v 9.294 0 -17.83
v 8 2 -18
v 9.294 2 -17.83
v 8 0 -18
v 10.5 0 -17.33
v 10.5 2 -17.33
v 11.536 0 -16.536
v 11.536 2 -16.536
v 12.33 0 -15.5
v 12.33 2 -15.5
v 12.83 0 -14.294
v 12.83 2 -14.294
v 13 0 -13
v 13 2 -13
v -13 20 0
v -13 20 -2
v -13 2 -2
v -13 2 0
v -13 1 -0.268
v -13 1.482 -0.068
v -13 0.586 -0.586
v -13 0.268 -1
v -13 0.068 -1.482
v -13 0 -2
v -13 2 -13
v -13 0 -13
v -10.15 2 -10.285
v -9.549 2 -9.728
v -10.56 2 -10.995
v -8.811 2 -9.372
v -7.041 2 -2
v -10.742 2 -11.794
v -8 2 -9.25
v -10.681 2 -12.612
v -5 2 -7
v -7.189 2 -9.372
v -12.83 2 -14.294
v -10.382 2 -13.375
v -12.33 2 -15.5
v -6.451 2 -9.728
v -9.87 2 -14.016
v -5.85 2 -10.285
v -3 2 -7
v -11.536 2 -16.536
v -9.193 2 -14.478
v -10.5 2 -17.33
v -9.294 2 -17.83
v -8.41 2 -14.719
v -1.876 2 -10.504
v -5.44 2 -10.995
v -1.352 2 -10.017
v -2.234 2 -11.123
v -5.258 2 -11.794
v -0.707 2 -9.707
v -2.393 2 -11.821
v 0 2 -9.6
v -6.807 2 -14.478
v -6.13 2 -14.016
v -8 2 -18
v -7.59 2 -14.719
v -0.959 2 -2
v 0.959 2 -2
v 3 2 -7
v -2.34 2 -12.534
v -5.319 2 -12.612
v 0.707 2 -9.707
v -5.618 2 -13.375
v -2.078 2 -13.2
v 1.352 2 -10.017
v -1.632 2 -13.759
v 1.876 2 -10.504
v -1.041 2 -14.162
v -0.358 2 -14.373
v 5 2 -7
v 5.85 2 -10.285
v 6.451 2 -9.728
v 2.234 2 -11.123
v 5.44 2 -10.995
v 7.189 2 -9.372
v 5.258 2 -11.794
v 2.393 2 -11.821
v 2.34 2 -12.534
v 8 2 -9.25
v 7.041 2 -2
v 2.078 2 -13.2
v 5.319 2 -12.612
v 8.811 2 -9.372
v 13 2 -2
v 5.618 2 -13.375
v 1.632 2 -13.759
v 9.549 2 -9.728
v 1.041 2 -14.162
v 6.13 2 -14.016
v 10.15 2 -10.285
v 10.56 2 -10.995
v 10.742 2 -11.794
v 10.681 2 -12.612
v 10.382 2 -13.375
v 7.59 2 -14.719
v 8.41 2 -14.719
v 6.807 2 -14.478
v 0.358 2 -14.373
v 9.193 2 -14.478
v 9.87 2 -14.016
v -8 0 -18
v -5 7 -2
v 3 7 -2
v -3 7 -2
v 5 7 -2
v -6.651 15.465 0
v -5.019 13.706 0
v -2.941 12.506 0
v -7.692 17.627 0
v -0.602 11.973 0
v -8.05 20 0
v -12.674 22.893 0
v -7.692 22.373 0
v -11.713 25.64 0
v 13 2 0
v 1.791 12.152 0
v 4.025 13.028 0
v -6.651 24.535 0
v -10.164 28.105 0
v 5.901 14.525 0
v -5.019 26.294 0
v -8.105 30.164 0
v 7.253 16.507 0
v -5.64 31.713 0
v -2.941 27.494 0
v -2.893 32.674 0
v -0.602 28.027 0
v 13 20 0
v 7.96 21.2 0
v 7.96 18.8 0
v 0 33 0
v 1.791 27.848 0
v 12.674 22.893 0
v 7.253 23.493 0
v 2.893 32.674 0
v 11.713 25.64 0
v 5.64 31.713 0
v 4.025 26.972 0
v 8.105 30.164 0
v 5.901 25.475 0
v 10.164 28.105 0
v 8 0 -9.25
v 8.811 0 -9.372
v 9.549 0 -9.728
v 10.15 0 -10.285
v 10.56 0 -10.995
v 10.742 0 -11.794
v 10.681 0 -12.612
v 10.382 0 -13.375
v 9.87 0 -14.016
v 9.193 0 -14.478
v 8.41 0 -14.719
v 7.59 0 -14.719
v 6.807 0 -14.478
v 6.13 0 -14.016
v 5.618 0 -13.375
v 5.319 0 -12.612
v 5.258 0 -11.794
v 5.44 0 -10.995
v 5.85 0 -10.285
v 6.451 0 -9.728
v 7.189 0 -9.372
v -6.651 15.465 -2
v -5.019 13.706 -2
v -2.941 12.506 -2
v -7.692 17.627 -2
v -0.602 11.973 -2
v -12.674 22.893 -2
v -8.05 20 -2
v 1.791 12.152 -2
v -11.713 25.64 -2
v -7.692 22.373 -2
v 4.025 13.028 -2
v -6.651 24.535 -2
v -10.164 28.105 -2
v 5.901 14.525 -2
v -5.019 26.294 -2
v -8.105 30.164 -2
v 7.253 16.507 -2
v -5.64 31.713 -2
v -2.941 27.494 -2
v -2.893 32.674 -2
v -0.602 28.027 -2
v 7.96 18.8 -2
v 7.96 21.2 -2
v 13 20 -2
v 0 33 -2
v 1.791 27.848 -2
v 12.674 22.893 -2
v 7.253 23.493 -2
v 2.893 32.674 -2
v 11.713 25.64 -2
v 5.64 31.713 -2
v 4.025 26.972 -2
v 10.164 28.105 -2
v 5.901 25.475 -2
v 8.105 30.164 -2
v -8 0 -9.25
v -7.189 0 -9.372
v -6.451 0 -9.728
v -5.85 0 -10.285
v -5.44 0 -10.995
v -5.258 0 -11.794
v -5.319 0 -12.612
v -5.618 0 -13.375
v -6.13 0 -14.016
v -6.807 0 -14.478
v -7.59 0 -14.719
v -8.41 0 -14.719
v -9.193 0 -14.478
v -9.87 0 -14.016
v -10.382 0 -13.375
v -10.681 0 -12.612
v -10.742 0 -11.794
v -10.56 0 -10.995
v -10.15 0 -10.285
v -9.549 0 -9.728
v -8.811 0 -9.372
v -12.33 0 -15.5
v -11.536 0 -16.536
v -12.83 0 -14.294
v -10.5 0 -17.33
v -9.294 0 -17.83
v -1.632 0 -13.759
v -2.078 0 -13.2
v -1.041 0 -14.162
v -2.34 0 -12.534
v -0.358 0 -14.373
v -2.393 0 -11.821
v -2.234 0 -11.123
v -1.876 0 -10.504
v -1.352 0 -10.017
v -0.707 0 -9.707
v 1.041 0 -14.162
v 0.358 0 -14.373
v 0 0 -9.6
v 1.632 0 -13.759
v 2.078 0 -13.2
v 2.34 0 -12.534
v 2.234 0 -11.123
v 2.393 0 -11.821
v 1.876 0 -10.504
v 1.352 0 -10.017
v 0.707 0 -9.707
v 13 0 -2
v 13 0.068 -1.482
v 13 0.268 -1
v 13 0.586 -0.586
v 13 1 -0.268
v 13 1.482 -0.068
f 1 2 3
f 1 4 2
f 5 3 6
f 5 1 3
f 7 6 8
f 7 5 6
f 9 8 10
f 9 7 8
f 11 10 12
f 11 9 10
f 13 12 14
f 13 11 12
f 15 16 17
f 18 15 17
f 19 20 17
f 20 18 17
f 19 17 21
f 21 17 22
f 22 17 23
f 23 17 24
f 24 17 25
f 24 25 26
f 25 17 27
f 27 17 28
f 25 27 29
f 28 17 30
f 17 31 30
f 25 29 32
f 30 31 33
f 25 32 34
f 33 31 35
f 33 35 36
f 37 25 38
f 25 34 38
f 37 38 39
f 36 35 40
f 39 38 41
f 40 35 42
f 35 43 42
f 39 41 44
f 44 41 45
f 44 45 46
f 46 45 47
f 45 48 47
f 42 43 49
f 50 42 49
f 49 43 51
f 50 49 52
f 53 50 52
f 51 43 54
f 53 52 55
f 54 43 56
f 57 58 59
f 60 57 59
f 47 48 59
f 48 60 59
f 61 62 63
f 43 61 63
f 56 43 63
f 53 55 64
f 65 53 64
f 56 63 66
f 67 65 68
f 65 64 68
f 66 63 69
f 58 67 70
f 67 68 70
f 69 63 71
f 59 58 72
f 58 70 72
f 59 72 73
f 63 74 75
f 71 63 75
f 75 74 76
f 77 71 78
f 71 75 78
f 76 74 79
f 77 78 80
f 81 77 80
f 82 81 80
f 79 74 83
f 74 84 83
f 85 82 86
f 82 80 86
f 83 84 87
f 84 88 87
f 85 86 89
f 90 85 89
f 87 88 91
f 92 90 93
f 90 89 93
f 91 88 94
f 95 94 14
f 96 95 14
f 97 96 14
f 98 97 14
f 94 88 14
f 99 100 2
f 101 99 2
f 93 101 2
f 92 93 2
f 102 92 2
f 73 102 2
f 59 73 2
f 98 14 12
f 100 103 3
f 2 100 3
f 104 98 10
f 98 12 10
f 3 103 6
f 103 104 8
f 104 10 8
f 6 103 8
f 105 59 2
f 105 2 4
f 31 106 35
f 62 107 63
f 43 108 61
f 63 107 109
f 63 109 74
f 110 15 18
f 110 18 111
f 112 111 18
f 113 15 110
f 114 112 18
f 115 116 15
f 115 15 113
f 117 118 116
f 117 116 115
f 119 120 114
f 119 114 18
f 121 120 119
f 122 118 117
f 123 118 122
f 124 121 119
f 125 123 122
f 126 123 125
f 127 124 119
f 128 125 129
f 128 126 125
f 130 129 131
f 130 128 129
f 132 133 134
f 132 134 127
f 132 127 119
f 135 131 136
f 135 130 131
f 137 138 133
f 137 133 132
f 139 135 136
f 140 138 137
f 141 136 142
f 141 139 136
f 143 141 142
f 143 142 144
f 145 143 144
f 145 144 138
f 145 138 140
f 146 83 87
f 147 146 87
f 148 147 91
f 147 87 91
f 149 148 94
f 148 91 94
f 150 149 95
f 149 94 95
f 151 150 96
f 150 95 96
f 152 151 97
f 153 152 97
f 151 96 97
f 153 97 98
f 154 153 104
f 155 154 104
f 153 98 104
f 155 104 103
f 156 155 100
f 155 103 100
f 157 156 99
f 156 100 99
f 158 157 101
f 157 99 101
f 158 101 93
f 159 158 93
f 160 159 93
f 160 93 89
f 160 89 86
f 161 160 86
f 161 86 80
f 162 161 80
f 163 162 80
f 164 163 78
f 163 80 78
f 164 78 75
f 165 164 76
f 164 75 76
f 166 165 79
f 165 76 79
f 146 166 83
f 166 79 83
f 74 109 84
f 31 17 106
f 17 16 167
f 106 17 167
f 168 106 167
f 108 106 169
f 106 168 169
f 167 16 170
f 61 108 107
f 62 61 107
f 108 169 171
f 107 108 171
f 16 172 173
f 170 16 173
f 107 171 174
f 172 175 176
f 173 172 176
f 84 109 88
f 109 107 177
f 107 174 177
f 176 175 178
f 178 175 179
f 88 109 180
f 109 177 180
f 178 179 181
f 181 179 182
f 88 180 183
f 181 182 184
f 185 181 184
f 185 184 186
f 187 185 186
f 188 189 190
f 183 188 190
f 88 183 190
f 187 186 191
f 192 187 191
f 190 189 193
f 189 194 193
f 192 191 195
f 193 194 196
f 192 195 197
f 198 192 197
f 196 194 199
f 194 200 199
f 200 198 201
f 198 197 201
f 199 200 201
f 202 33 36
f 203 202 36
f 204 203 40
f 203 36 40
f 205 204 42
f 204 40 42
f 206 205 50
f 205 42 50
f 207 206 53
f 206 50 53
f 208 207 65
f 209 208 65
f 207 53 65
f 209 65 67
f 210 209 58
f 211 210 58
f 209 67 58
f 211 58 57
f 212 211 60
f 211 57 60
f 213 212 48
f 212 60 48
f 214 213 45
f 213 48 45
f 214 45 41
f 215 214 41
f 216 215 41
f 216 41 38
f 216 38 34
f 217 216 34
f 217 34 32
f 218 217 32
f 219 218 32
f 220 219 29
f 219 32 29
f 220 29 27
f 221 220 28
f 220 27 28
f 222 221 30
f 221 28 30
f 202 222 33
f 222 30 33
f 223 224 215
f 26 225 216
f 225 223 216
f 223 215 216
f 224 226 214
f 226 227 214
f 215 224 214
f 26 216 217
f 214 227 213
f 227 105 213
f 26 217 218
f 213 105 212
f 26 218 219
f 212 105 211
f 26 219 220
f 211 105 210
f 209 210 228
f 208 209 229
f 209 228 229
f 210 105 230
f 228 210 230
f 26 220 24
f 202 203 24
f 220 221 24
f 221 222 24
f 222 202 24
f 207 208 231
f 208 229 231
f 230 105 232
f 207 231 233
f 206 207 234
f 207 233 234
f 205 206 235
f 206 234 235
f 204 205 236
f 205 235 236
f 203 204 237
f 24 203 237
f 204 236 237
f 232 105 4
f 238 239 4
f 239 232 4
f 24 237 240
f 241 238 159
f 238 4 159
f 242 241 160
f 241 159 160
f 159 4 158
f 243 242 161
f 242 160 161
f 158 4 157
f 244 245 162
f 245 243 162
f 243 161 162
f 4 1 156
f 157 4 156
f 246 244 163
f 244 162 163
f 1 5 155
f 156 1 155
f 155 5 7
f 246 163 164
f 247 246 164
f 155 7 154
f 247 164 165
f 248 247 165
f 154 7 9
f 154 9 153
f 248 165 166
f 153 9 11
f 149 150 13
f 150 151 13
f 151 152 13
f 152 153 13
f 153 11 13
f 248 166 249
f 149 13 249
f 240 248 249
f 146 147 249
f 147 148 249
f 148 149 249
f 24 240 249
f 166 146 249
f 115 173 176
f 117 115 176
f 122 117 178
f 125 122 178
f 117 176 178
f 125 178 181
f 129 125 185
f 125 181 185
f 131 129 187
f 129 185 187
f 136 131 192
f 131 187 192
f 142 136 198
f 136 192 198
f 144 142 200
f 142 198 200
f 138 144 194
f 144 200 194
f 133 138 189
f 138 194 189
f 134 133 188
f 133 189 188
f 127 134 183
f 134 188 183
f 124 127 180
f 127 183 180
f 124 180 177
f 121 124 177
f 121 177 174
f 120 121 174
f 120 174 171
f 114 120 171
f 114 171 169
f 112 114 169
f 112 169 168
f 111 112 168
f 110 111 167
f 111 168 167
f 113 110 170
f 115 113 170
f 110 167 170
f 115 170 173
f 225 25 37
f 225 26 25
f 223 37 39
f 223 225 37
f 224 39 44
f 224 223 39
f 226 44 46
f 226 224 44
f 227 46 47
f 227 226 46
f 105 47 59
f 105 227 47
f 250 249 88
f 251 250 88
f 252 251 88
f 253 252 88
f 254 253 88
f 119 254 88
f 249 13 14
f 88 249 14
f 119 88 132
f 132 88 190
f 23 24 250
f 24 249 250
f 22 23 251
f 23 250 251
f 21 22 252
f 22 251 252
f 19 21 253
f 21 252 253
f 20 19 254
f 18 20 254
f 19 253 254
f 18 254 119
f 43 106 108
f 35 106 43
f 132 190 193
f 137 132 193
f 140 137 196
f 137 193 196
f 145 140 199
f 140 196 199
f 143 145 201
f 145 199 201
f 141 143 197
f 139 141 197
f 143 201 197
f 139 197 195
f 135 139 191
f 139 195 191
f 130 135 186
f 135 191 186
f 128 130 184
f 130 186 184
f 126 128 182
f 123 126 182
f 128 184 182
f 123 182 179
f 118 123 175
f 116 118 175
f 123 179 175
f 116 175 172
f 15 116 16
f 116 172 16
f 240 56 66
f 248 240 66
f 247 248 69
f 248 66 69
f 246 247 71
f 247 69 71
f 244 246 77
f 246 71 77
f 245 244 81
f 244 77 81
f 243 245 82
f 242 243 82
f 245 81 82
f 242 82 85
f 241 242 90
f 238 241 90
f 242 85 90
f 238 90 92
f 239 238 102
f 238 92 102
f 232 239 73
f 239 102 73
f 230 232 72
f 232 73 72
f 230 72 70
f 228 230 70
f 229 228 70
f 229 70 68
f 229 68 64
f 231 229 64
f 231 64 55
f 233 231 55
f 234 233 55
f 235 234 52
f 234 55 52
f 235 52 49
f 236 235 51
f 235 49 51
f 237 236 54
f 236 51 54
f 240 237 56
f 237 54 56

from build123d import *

# Parameters (mm, degrees)
BOSS_EXTRUDE1_DEPTH = 13
SKETCH12_R          = 8.05
BOSS_EXTRUDE2_DEPTH = 2
FILLET3_R           = 2
SKETCH15_R          = 2.4
SKETCH15_R_2        = 2.75
CUT_EXTRUDE1_DEPTH  = 2
FILLET4_R           = 5
RIB1_REACH          = 43.255
SKETCH17_WALL_W     = 91.58167319
SKETCH17_WALL_H     = 2
RIB1_DRAFT_ANGLE    = 30
RIB2_REACH          = 43.255
SKETCH18_WALL_W     = 91.58167319
SKETCH18_WALL_H     = 2
RIB2_DRAFT_ANGLE    = 30


with BuildPart() as part:
    # Sketch1 → Boss-Extrude1 (new, symmetric)
    with BuildSketch(Plane(origin=(0, 0, 0), x_dir=(0, 0, -1), z_dir=(1, 0, 0))):
        Polygon((0, 7.5), (2, 7.5), (2, 2), (18, 2), (18, 0), (0, 0), align=None)
    extrude(amount=BOSS_EXTRUDE1_DEPTH, both=True)

    # Sketch12 → Boss-Extrude2 (add)
    with BuildSketch(Plane(origin=(0, 0, -2), x_dir=(-1, 0, 0), z_dir=(0, 0, -1))):
        with BuildLine():
            Line((13, 20), (13, 7.5))
            Line((13, 7.5), (-13, 7.5))
            Line((-13, 7.5), (-13, 20))
            ThreePointArc((-13, 20), (0, 33), (13, 20))
        make_face()
        with Locations((0, 20)):
            Circle(SKETCH12_R, mode=Mode.SUBTRACT)
    extrude(amount=-BOSS_EXTRUDE2_DEPTH)

    # Fillet3
    fillet3_edges = [part.edges().sort_by_distance(p)[0] for p in [
        (0, 0, 0),
    ]]
    fillet(fillet3_edges, radius=FILLET3_R)

    # Sketch15 → Cut-Extrude1 (cut)
    with BuildSketch(Plane(origin=(0, 2, 0), x_dir=(1, 0, 0), z_dir=(0, 1, 0))):
        with Locations(Location((0, 12, 0), (0, 0, 270))):
            Circle(SKETCH15_R)
        with Locations(Location((8, 12, 0), (0, 0, 270))):
            Circle(SKETCH15_R_2)
        with Locations(Location((-8, 12, 0), (0, 0, 270))):
            Circle(SKETCH15_R_2)
    extrude(amount=-CUT_EXTRUDE1_DEPTH, mode=Mode.SUBTRACT)

    # Fillet4
    fillet4_edges = [part.edges().sort_by_distance(p)[0] for p in [
        (13, 1, -18),
        (-13, 1, -18),
    ]]
    fillet(fillet4_edges, radius=FILLET4_R)

    # Sketch17 wall → Rib1 (add, up to next)
    with BuildSketch(Plane(origin=(4, 4.5, -4.5), x_dir=(0, -0.707106781187, -0.707106781187), z_dir=(0, 0.707106781187, -0.707106781187)), mode=Mode.PRIVATE) as rib1_sk1:
        Rectangle(SKETCH17_WALL_W, SKETCH17_WALL_H)
    rib1_tool1 = extrude(rib1_sk1.sketch, amount=-RIB1_REACH, mode=Mode.PRIVATE) - part.part
    add(rib1_tool1.solids().sort_by_distance((4, 4.5, -4.5))[0])

    # Rib1 draft
    rib1_draft_faces = [part.faces().sort_by_distance(p)[0] for p in [
        (3, 4.146446609, -4.146446609),
        (5, 4.146446609, -4.146446609),
    ]]
    draft(rib1_draft_faces, Plane(origin=(4, 4.5, -4.5), x_dir=(0, -0.707106781187, -0.707106781187), z_dir=(0, 0.707106781187, -0.707106781187)), RIB1_DRAFT_ANGLE)

    # Sketch18 wall → Rib2 (add, up to next)
    with BuildSketch(Plane(origin=(-4, 4.5, -4.5), x_dir=(0, -0.707106781187, -0.707106781187), z_dir=(0, 0.707106781187, -0.707106781187)), mode=Mode.PRIVATE) as rib2_sk1:
        Rectangle(SKETCH18_WALL_W, SKETCH18_WALL_H)
    rib2_tool1 = extrude(rib2_sk1.sketch, amount=-RIB2_REACH, mode=Mode.PRIVATE) - part.part
    add(rib2_tool1.solids().sort_by_distance((-4, 4.5, -4.5))[0])

    # Rib2 draft
    rib2_draft_faces = [part.faces().sort_by_distance(p)[0] for p in [
        (-5, 4.146446609, -4.146446609),
        (-3, 4.146446609, -4.146446609),
    ]]
    draft(rib2_draft_faces, Plane(origin=(-4, 4.5, -4.5), x_dir=(0, -0.707106781187, -0.707106781187), z_dir=(0, 0.707106781187, -0.707106781187)), RIB2_DRAFT_ANGLE)


solid = part.part
